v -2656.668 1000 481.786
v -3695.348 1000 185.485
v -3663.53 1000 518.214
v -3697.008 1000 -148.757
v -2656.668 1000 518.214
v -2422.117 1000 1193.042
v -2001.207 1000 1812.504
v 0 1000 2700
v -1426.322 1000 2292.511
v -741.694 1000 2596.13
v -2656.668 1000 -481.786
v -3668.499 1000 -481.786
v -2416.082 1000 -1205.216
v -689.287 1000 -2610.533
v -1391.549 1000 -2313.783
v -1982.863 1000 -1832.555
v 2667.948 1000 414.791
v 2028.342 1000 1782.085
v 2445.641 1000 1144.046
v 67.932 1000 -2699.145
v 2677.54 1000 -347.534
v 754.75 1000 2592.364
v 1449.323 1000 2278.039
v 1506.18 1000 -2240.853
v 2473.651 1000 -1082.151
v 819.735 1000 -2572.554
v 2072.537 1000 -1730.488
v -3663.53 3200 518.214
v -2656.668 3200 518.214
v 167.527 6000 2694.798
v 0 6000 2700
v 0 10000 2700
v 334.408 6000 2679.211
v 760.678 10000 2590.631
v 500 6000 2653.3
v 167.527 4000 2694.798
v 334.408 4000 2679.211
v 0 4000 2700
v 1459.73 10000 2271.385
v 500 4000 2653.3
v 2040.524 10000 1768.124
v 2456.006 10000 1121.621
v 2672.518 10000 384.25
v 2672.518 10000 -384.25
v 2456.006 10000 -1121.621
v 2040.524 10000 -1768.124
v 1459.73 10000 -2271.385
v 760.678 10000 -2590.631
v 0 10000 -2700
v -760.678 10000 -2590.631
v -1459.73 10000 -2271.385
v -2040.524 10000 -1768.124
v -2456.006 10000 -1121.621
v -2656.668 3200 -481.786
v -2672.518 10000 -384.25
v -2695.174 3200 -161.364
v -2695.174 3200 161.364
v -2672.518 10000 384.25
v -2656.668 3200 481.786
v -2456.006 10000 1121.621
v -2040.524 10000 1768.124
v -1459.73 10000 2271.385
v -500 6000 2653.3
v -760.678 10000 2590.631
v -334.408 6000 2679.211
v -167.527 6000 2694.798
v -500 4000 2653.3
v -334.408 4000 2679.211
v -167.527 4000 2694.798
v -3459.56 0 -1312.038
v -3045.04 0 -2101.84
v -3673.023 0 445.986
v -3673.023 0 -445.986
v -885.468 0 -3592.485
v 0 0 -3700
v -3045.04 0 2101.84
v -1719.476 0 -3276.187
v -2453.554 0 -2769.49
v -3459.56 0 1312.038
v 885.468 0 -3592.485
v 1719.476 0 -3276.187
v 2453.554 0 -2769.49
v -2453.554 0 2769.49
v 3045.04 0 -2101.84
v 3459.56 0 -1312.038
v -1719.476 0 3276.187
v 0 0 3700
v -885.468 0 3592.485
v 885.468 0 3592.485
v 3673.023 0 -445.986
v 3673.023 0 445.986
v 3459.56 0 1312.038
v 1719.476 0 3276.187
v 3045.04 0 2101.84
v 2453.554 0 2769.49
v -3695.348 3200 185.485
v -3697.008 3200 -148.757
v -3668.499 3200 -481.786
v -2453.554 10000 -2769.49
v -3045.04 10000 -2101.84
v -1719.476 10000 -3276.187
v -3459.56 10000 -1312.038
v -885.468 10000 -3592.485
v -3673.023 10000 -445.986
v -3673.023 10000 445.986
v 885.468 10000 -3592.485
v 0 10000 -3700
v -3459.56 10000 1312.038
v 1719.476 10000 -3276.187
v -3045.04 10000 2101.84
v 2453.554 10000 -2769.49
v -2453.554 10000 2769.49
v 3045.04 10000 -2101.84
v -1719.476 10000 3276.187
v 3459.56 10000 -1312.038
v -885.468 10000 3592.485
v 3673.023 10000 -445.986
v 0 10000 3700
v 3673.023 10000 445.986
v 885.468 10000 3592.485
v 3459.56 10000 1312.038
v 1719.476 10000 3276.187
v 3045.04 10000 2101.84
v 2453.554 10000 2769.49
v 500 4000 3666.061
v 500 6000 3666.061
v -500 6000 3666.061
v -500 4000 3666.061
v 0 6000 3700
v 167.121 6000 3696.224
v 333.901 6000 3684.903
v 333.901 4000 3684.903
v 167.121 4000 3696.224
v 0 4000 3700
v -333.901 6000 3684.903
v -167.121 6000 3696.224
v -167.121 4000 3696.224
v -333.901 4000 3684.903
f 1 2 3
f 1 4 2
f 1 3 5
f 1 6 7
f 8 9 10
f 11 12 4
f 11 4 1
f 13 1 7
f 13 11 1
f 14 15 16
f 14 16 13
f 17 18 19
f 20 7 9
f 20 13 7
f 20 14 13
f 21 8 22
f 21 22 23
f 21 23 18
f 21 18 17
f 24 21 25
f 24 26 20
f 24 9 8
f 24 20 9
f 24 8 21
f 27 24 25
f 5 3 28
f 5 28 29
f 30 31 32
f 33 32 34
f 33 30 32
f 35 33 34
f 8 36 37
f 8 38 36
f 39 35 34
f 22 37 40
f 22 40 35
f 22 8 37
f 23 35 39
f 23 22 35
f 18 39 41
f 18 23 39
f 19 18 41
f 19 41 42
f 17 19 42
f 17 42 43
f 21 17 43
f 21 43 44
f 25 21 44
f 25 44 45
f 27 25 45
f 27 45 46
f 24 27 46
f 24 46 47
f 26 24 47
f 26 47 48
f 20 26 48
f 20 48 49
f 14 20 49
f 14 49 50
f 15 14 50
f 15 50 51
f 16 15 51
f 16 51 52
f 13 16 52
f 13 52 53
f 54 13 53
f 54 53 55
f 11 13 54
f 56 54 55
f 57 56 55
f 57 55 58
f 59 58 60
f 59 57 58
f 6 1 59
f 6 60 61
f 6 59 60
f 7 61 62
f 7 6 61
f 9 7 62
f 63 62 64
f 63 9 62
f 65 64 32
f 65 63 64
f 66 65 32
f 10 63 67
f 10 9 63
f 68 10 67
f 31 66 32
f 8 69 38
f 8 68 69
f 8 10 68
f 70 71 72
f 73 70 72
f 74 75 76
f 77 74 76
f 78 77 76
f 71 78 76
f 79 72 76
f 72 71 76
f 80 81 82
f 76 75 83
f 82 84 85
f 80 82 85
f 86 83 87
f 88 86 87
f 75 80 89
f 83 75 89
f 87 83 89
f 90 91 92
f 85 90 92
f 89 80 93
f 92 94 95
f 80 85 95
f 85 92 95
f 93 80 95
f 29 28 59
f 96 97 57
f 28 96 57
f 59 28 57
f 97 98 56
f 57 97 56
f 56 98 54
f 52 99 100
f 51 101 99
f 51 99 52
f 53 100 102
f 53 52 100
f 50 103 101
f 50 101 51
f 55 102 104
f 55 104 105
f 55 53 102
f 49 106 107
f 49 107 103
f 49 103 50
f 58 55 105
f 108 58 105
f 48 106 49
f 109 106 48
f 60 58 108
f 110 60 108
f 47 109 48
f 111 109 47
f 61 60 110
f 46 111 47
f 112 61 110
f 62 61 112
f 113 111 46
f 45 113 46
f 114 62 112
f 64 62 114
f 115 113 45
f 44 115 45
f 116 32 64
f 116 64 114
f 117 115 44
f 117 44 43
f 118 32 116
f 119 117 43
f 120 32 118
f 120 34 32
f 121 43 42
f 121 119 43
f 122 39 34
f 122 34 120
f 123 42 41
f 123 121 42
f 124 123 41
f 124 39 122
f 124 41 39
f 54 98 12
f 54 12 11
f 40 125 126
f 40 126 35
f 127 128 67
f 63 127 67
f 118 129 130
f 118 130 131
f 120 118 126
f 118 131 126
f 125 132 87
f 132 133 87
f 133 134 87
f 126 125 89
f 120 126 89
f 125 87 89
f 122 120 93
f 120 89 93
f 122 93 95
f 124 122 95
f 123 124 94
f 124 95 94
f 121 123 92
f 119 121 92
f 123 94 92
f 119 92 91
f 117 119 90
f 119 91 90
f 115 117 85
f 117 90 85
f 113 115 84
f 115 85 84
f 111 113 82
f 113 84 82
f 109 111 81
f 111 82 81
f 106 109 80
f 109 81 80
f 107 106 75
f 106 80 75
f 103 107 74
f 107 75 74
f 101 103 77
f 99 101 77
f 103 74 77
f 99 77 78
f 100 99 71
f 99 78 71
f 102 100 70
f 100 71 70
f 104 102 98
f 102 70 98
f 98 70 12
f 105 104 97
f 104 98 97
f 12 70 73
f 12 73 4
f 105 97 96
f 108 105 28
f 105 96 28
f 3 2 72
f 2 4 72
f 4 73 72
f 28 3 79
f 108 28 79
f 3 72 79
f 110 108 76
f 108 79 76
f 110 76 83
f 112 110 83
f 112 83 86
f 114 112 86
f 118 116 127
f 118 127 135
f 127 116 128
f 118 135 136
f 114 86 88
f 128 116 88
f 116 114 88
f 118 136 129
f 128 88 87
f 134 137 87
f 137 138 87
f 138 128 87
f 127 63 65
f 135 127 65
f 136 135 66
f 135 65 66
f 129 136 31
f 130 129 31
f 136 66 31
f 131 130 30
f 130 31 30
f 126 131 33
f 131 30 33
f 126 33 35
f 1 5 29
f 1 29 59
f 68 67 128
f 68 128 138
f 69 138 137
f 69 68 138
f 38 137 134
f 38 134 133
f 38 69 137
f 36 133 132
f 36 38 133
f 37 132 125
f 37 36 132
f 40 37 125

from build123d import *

# Parameters (mm, degrees)
SKETCH_1_R          = 3700
EXTRUDE_1_DEPTH     = 1000
SKETCH_2_R          = 3700
SKETCH_2_R_2        = 2700
EXTRUDE_2_DEPTH     = 9000
SKETCH_4_W          = 1000
SKETCH_4_H          = 1046.700167716
CUT_EXTRUDE_2_DEPTH = 2000
SKETCH_3_W          = 1043.332473871
SKETCH_3_H          = 1000
CUT_EXTRUDE_1_DEPTH = 2200


with BuildPart() as part:
    # ｽｹｯﾁ1 → ﾎﾞｽ - 押し出し1 (new body)
    with BuildSketch(Plane(origin=(0, 0, 0), x_dir=(1, 0, 0), z_dir=(0, 1, 0))):
        Circle(SKETCH_1_R)
    extrude(amount=EXTRUDE_1_DEPTH)

    # ｽｹｯﾁ2 → ﾎﾞｽ - 押し出し2 (add)
    with BuildSketch(Plane(origin=(0, 1000, 0), x_dir=(1, 0, 0), z_dir=(0, 1, 0))):
        Circle(SKETCH_2_R)
        Circle(SKETCH_2_R_2, mode=Mode.SUBTRACT)
    extrude(amount=EXTRUDE_2_DEPTH)

    # ｽｹｯﾁ4 → ｶｯﾄ - 押し出し2 (cut)
    with BuildSketch(Plane(origin=(0, 4000, 0), x_dir=(1, 0, 0), z_dir=(0, 1, 0))):
        with Locations((0, -3176.649916142)):
            Rectangle(SKETCH_4_W, SKETCH_4_H)
    extrude(amount=CUT_EXTRUDE_2_DEPTH, mode=Mode.SUBTRACT)

    # ｽｹｯﾁ3 → ｶｯﾄ - 押し出し1 (cut)
    with BuildSketch(Plane(origin=(0, 1000, 0), x_dir=(1, 0, 0), z_dir=(0, 1, 0))):
        with Locations((-3178.333763065, -18.214097747)):
            Rectangle(SKETCH_3_W, SKETCH_3_H)
    extrude(amount=CUT_EXTRUDE_1_DEPTH, mode=Mode.SUBTRACT)


solid = part.part
